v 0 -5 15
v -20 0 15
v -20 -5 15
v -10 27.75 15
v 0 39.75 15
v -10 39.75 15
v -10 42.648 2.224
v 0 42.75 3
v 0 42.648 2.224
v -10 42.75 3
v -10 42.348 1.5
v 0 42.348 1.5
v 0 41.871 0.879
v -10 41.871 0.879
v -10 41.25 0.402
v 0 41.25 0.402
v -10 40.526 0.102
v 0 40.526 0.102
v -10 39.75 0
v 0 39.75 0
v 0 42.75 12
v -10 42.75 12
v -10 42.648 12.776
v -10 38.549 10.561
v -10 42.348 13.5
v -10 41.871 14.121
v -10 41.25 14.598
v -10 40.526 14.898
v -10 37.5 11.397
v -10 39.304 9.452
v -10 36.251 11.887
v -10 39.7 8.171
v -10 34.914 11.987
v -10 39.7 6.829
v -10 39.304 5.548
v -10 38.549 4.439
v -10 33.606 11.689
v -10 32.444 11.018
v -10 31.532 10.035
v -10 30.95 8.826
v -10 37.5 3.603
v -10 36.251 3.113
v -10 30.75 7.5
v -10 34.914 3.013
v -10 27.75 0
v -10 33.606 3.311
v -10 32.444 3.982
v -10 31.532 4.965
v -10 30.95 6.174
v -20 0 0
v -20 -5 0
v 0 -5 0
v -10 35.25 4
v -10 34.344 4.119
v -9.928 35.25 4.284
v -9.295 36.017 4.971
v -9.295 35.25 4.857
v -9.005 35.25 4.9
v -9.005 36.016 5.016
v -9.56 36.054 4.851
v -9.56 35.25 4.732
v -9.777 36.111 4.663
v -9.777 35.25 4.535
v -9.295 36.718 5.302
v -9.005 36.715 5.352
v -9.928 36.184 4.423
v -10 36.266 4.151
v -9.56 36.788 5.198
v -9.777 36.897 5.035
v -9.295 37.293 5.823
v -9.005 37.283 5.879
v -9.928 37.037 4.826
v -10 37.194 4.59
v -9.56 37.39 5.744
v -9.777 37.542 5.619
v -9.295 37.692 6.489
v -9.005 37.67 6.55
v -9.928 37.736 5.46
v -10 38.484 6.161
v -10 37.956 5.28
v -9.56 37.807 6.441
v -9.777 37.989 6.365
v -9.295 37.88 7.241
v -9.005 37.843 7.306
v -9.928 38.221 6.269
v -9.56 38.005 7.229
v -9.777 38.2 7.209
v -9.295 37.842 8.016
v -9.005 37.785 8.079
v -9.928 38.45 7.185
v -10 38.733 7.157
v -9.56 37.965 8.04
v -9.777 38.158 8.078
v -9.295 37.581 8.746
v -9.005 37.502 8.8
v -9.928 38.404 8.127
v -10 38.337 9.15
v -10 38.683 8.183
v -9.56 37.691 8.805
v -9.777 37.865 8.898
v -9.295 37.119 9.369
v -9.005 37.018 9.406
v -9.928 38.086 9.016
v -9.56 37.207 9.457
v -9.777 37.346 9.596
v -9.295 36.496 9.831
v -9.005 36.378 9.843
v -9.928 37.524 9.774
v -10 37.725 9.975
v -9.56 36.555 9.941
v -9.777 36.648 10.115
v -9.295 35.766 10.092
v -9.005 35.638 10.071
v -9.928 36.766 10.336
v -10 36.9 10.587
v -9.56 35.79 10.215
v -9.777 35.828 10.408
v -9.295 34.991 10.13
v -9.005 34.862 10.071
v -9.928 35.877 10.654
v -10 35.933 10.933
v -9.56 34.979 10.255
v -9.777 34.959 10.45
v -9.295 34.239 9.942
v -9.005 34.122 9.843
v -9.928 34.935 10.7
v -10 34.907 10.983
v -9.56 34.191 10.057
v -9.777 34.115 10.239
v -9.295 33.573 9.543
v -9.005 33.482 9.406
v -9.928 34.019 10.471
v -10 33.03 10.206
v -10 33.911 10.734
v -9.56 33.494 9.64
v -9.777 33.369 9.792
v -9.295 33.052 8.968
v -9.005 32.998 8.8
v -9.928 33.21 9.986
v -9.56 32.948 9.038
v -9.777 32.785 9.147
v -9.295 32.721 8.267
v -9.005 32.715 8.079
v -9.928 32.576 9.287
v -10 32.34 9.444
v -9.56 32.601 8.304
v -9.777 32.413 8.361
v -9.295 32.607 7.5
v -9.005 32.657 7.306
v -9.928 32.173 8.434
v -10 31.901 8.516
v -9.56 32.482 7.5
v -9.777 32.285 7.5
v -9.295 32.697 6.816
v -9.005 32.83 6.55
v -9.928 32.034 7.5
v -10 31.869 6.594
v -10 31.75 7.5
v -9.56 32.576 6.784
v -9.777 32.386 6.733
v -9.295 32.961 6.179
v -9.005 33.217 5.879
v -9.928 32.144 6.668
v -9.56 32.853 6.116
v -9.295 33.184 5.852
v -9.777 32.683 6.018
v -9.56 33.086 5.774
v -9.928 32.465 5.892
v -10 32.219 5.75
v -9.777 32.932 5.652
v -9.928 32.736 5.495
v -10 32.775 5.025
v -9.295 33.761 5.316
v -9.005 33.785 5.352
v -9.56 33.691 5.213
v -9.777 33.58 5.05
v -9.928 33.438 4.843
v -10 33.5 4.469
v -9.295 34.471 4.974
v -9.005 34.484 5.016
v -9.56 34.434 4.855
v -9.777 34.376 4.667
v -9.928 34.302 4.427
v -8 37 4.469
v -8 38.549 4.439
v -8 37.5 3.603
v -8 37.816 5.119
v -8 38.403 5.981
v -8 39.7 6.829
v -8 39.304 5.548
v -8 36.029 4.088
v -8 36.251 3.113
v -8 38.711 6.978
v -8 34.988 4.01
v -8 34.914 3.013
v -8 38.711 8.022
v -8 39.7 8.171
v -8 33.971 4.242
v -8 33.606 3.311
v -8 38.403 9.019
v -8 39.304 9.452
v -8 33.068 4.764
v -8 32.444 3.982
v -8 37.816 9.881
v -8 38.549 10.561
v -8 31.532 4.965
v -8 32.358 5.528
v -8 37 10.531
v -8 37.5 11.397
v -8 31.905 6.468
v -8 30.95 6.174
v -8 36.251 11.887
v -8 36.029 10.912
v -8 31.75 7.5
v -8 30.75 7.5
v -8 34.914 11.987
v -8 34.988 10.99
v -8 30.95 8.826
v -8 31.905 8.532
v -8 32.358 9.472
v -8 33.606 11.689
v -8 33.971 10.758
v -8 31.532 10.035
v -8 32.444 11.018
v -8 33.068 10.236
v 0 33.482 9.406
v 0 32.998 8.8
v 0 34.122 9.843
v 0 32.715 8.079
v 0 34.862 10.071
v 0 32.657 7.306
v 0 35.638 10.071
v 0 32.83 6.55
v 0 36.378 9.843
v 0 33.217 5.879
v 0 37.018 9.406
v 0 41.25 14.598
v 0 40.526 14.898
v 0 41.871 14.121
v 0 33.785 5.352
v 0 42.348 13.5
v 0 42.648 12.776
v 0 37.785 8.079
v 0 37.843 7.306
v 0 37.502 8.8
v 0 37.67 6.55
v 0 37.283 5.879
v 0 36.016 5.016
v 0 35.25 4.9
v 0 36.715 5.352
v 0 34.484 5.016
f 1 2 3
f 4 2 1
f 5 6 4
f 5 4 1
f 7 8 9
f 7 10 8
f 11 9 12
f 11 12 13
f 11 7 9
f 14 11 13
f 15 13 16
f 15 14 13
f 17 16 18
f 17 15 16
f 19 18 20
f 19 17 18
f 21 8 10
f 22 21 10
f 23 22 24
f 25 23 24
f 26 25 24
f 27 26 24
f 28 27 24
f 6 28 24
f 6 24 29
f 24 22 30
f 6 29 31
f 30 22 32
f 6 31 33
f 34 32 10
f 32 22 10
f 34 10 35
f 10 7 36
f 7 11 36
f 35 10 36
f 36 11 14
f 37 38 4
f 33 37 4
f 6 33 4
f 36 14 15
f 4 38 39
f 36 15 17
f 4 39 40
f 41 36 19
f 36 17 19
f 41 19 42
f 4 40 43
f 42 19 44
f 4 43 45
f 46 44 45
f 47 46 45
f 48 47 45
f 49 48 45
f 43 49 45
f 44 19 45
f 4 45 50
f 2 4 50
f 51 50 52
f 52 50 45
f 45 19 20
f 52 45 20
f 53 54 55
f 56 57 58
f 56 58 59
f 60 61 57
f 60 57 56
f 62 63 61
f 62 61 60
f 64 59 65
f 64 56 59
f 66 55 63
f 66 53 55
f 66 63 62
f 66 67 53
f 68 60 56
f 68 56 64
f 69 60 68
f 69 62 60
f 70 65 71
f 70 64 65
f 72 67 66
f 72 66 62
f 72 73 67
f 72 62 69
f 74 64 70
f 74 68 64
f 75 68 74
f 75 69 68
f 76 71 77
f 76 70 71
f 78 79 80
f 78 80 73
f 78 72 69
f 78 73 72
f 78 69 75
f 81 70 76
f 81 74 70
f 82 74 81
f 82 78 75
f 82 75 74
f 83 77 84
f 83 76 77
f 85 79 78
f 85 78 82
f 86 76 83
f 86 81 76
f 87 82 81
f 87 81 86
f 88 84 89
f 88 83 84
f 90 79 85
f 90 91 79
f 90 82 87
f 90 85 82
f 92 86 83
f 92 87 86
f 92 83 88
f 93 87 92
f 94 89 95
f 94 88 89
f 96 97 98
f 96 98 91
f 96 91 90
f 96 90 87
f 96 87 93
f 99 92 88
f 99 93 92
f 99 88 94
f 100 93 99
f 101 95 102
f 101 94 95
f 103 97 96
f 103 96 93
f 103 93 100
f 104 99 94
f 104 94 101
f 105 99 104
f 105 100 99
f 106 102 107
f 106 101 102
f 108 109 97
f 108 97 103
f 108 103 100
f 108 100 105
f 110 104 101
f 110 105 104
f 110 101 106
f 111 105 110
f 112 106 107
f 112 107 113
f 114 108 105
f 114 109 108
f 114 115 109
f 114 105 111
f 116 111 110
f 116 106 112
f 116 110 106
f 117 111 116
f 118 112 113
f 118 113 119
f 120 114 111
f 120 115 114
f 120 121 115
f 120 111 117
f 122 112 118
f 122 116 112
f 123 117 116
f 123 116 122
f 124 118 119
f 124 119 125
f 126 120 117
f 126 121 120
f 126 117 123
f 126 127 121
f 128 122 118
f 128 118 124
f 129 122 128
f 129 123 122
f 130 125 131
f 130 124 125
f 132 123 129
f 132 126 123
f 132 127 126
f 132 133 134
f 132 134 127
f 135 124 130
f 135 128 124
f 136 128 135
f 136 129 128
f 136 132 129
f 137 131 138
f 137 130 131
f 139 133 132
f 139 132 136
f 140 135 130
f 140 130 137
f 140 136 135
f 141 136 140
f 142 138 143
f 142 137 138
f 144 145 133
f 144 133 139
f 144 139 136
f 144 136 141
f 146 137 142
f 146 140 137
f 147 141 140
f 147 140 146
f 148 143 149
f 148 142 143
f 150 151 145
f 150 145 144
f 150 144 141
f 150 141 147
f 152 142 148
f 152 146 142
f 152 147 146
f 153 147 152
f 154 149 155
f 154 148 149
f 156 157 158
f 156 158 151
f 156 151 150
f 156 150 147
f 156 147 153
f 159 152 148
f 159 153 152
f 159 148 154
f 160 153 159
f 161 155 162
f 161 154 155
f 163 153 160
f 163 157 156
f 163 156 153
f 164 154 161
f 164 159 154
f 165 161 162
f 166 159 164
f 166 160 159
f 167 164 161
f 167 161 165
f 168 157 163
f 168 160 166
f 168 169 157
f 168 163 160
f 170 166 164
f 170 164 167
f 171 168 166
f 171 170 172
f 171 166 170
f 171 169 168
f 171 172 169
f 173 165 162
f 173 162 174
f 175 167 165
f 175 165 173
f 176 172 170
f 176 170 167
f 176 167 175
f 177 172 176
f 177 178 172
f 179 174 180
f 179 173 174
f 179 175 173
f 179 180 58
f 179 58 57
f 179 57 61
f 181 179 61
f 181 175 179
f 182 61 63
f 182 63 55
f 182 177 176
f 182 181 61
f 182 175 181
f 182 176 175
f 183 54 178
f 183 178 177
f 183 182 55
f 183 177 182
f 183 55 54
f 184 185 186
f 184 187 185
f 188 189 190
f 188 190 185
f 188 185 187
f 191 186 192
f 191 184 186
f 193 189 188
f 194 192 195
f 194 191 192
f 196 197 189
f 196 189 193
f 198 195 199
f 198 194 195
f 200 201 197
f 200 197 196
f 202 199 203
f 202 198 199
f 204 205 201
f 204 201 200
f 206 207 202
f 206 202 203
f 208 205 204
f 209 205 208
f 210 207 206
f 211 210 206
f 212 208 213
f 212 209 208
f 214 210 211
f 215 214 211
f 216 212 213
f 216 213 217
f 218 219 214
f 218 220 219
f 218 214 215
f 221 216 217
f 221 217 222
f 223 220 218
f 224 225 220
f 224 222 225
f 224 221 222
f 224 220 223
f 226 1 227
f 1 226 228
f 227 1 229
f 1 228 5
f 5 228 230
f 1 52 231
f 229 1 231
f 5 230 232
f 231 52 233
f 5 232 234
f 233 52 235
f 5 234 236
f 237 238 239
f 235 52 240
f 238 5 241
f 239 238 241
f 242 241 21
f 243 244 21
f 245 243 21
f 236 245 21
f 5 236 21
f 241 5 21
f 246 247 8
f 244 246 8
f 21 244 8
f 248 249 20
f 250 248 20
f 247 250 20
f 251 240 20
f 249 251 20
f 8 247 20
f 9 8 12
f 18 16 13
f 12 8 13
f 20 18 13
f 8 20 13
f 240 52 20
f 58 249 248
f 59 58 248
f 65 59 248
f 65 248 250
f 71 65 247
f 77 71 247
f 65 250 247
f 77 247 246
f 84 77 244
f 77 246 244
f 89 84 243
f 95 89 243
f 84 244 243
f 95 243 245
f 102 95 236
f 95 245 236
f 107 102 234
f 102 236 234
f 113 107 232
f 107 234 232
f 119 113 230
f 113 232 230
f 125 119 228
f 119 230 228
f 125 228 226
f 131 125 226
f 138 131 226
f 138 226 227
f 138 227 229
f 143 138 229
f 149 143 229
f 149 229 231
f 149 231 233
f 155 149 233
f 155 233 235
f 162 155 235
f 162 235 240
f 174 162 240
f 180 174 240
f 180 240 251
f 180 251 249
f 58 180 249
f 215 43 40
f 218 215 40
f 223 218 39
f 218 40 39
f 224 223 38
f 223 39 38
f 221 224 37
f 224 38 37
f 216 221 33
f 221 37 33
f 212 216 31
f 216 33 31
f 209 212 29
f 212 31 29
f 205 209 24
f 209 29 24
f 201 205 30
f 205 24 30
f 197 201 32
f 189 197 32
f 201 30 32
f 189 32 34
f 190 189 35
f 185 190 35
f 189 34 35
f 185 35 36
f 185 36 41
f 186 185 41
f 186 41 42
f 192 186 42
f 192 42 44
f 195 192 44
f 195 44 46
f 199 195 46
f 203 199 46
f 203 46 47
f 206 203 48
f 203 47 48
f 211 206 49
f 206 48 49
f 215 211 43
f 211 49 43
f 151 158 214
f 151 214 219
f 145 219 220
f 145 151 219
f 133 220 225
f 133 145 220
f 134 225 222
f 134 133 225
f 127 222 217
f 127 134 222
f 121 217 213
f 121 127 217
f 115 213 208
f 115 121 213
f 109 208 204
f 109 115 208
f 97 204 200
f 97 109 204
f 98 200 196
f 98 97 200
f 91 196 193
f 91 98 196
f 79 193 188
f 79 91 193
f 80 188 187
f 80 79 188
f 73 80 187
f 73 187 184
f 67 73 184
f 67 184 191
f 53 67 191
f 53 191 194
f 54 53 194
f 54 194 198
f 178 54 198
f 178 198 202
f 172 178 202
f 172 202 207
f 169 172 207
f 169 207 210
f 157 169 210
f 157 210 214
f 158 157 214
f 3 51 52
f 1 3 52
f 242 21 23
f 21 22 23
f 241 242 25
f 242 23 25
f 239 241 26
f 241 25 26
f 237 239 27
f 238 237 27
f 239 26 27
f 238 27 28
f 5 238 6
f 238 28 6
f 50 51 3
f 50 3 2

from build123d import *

# Parameters (mm, degrees)
SKETCH_1_W          = 20
SKETCH_1_H          = 5
EXTRUDE_1_DEPTH     = 15
FILLET_1_R          = 3
SKETCH_3_R          = 2.6
CUT_EXTRUDE_1_DEPTH = 50.523353077
SKETCH_9_R          = 4.5
SKETCH_9_R_2        = 3.5
CUT_EXTRUDE_2_DEPTH = 2
FILLET_2_R          = 1


with BuildPart() as part:
    # 草图1 → 凸台-拉伸1 (new body)
    with BuildSketch(Plane.XY):
        Polygon((-10, 27.75), (-20, 0), (0, 0), (0, 42.75), (-10, 42.75), align=None)
        with Locations((-10, -2.5)):
            Rectangle(SKETCH_1_W, SKETCH_1_H)
    extrude(amount=EXTRUDE_1_DEPTH)

    # 圆角1
    fillet_1_edges = [part.edges().sort_by_distance(p)[0] for p in [
        (-5, 42.75, 15),
        (-5, 42.75, 0),
    ]]
    fillet(fillet_1_edges, radius=FILLET_1_R)

    # 草图3 → 切除-拉伸1 (cut, through all)
    with BuildSketch(Plane(origin=(0, 0, 0), x_dir=(0, 0, -1), z_dir=(1, 0, 0))):
        with Locations((-7.5, 35.25)):
            Circle(SKETCH_3_R)
    extrude(amount=-CUT_EXTRUDE_1_DEPTH, mode=Mode.SUBTRACT)

    # 草图9 → 切除-拉伸2 (cut)
    with BuildSketch(Plane.ZY.offset(10)):
        with Locations(Location((7.5, 35.25, 0), (0, 0, 270))):
            Circle(SKETCH_9_R)
        with Locations(Location((7.5, 35.25, 0), (0, 0, 270))):
            Circle(SKETCH_9_R_2, mode=Mode.SUBTRACT)
    extrude(amount=-CUT_EXTRUDE_2_DEPTH, mode=Mode.SUBTRACT)

    # 圆角2
    # the kernel refuses this fillet: 1 mm, written as the material it takes off along each edge
    with BuildSketch(Plane(origin=(-10, 35.25, 7.5), x_dir=(0, 0, -1), z_dir=(0, -1, 0))) as fillet_2_piece_1:
        with BuildLine():
            CenterArc((3.6, 0.994987437), FILLET_2_R, 180, 84.260829523)
            Line((3.5, 0), (3.498, -0.019899749))
            ThreePointArc((3.498, -0.019899749), (3.05, -0.02), (2.6, -0.02))
            Line((2.6, -0.02), (2.58, 0))
            Line((2.58, 0), (2.58, 0.994987437))
            Line((2.58, 0.994987437), (2.6, 0.994987437))
        make_face()
    revolve(axis=Axis((-10, 35.25, 7.5), (1, 0, 0)), mode=Mode.SUBTRACT)


solid = part.part
